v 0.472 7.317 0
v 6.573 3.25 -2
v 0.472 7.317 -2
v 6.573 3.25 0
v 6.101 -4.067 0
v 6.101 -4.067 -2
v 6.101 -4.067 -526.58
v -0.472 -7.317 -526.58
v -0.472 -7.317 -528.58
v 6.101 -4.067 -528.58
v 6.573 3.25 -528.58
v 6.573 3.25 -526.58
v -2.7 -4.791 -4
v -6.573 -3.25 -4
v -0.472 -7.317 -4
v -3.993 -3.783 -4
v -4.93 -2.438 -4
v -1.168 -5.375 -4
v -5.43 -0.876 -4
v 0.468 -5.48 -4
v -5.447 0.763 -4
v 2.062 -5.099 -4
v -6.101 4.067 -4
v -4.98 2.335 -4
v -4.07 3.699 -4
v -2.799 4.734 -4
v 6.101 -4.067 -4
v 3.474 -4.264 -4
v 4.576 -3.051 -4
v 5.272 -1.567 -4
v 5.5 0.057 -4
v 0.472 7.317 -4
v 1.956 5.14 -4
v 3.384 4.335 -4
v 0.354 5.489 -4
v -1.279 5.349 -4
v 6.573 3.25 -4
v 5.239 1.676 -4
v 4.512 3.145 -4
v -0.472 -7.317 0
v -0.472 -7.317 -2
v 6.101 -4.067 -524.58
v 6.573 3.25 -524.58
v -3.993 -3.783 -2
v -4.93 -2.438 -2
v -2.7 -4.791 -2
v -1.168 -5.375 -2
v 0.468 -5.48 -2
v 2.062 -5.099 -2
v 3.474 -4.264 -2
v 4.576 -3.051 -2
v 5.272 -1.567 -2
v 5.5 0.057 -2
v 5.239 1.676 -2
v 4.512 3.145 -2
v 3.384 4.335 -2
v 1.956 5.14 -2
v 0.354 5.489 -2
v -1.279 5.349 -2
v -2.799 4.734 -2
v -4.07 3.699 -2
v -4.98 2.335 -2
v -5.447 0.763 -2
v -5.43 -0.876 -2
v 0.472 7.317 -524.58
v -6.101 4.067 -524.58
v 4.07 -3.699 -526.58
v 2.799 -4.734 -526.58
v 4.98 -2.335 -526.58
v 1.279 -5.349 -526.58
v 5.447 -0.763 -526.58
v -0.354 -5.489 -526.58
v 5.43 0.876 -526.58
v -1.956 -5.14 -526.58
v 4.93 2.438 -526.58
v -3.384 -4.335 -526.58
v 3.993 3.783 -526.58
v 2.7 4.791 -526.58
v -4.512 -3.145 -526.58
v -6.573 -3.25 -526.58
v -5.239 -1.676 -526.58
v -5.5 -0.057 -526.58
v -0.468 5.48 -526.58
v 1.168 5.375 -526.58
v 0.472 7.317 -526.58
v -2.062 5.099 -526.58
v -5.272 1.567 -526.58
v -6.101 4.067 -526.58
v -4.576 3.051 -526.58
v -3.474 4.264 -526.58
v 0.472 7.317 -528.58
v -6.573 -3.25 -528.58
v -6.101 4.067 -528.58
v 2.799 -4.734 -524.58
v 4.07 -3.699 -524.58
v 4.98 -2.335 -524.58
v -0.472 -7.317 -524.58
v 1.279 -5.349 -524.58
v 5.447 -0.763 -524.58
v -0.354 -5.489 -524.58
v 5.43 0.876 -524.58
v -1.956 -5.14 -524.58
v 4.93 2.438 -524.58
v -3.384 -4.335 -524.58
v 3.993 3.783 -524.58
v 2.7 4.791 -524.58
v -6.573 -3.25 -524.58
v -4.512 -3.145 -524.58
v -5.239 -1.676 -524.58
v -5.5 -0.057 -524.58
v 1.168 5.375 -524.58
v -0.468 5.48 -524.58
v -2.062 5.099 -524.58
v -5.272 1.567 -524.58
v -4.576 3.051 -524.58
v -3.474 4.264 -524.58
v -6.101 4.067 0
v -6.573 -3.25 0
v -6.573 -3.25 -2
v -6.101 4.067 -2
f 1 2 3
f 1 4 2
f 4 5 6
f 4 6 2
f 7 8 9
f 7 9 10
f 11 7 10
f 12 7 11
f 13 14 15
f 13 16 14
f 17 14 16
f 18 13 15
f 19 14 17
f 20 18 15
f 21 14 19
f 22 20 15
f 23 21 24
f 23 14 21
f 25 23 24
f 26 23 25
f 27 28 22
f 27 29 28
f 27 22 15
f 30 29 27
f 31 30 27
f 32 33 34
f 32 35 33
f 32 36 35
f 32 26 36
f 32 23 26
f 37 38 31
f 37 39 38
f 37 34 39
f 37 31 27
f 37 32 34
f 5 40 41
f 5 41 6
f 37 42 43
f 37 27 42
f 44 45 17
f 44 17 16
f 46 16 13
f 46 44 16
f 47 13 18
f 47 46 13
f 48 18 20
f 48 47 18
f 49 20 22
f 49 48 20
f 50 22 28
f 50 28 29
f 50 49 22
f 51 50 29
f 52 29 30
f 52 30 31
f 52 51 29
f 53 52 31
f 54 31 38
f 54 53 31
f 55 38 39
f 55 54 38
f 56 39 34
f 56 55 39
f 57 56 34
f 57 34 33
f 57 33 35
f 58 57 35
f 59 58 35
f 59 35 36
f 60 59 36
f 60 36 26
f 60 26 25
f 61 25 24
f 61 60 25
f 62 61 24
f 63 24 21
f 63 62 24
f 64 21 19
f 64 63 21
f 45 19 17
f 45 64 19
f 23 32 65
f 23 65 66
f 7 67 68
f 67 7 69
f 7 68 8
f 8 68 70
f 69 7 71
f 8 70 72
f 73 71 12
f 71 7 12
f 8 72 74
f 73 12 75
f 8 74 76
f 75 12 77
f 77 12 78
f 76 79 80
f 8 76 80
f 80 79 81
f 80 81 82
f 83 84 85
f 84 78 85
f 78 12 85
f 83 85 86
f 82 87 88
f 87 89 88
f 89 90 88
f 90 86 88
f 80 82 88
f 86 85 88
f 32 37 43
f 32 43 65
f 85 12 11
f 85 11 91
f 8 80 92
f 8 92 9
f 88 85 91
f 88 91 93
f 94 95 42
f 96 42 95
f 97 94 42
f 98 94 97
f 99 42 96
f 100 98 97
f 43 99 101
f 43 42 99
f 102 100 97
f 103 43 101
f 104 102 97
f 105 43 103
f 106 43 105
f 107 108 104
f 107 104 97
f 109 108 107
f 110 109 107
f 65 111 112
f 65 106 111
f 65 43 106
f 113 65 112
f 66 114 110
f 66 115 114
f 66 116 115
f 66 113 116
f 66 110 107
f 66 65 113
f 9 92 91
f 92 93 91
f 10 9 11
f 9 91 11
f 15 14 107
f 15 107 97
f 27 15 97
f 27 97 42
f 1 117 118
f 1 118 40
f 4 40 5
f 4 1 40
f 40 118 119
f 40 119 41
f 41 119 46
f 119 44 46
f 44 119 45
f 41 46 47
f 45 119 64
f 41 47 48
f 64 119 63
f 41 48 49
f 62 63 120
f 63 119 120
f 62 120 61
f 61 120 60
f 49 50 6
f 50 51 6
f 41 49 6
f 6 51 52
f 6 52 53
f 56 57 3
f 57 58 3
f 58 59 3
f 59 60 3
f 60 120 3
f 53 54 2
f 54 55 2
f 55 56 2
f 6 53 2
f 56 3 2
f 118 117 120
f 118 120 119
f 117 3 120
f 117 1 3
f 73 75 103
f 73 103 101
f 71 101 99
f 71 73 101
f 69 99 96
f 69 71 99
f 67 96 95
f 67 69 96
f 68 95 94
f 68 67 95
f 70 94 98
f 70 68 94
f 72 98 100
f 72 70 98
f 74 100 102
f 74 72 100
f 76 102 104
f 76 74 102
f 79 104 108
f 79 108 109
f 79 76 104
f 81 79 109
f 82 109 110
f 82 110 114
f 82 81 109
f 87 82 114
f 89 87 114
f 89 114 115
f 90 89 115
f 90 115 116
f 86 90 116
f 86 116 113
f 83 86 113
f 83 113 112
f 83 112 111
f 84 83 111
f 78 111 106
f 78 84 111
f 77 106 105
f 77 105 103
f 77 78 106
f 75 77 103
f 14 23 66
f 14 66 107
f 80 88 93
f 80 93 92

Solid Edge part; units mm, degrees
sketch "Sketch1" plane through (0, 0, 0) normal (0, 0, 1) x (1, 0, 0)
  line L0 (-6.1009, 4.0673) -> (-6.5728, -3.2499)
  line L1 (-6.5728, -3.2499) -> (-0.4719, -7.3171)
  line L2 (-0.4719, -7.3171) -> (6.1009, -4.0673)
  line L3 (6.1009, -4.0673) -> (6.5728, 3.2499)
  line L4 (6.5728, 3.2499) -> (0.4719, 7.3171)
  line L5 (0.4719, 7.3171) -> (-6.1009, 4.0673)
extrude "Protrusion1" add sketch "Sketch1" against normal blind 528.58
sketch "Sketch2" plane through (0, 0, -2) normal (0, 0, 1) x (-0.8964, -0.4432, 0)
  circle A0 centre (0, 0) radius 5.5
  circle A1 centre (0, 0) radius 13.1424
extrude "ExtrudedCutout_1" cut sketch "Sketch2" against normal blind 2
sketch "Sketch3" plane through (0, 0, -526.58) normal (0, 0, -1) x (0.8964, 0.4432, 0)
  circle A0 centre (0, 0) radius 5.5
  circle A1 centre (0, 0) radius 13.1424
extrude "ExtrudedCutout_2" cut sketch "Sketch3" against normal blind 2
properties part number "BumbleB0532"
